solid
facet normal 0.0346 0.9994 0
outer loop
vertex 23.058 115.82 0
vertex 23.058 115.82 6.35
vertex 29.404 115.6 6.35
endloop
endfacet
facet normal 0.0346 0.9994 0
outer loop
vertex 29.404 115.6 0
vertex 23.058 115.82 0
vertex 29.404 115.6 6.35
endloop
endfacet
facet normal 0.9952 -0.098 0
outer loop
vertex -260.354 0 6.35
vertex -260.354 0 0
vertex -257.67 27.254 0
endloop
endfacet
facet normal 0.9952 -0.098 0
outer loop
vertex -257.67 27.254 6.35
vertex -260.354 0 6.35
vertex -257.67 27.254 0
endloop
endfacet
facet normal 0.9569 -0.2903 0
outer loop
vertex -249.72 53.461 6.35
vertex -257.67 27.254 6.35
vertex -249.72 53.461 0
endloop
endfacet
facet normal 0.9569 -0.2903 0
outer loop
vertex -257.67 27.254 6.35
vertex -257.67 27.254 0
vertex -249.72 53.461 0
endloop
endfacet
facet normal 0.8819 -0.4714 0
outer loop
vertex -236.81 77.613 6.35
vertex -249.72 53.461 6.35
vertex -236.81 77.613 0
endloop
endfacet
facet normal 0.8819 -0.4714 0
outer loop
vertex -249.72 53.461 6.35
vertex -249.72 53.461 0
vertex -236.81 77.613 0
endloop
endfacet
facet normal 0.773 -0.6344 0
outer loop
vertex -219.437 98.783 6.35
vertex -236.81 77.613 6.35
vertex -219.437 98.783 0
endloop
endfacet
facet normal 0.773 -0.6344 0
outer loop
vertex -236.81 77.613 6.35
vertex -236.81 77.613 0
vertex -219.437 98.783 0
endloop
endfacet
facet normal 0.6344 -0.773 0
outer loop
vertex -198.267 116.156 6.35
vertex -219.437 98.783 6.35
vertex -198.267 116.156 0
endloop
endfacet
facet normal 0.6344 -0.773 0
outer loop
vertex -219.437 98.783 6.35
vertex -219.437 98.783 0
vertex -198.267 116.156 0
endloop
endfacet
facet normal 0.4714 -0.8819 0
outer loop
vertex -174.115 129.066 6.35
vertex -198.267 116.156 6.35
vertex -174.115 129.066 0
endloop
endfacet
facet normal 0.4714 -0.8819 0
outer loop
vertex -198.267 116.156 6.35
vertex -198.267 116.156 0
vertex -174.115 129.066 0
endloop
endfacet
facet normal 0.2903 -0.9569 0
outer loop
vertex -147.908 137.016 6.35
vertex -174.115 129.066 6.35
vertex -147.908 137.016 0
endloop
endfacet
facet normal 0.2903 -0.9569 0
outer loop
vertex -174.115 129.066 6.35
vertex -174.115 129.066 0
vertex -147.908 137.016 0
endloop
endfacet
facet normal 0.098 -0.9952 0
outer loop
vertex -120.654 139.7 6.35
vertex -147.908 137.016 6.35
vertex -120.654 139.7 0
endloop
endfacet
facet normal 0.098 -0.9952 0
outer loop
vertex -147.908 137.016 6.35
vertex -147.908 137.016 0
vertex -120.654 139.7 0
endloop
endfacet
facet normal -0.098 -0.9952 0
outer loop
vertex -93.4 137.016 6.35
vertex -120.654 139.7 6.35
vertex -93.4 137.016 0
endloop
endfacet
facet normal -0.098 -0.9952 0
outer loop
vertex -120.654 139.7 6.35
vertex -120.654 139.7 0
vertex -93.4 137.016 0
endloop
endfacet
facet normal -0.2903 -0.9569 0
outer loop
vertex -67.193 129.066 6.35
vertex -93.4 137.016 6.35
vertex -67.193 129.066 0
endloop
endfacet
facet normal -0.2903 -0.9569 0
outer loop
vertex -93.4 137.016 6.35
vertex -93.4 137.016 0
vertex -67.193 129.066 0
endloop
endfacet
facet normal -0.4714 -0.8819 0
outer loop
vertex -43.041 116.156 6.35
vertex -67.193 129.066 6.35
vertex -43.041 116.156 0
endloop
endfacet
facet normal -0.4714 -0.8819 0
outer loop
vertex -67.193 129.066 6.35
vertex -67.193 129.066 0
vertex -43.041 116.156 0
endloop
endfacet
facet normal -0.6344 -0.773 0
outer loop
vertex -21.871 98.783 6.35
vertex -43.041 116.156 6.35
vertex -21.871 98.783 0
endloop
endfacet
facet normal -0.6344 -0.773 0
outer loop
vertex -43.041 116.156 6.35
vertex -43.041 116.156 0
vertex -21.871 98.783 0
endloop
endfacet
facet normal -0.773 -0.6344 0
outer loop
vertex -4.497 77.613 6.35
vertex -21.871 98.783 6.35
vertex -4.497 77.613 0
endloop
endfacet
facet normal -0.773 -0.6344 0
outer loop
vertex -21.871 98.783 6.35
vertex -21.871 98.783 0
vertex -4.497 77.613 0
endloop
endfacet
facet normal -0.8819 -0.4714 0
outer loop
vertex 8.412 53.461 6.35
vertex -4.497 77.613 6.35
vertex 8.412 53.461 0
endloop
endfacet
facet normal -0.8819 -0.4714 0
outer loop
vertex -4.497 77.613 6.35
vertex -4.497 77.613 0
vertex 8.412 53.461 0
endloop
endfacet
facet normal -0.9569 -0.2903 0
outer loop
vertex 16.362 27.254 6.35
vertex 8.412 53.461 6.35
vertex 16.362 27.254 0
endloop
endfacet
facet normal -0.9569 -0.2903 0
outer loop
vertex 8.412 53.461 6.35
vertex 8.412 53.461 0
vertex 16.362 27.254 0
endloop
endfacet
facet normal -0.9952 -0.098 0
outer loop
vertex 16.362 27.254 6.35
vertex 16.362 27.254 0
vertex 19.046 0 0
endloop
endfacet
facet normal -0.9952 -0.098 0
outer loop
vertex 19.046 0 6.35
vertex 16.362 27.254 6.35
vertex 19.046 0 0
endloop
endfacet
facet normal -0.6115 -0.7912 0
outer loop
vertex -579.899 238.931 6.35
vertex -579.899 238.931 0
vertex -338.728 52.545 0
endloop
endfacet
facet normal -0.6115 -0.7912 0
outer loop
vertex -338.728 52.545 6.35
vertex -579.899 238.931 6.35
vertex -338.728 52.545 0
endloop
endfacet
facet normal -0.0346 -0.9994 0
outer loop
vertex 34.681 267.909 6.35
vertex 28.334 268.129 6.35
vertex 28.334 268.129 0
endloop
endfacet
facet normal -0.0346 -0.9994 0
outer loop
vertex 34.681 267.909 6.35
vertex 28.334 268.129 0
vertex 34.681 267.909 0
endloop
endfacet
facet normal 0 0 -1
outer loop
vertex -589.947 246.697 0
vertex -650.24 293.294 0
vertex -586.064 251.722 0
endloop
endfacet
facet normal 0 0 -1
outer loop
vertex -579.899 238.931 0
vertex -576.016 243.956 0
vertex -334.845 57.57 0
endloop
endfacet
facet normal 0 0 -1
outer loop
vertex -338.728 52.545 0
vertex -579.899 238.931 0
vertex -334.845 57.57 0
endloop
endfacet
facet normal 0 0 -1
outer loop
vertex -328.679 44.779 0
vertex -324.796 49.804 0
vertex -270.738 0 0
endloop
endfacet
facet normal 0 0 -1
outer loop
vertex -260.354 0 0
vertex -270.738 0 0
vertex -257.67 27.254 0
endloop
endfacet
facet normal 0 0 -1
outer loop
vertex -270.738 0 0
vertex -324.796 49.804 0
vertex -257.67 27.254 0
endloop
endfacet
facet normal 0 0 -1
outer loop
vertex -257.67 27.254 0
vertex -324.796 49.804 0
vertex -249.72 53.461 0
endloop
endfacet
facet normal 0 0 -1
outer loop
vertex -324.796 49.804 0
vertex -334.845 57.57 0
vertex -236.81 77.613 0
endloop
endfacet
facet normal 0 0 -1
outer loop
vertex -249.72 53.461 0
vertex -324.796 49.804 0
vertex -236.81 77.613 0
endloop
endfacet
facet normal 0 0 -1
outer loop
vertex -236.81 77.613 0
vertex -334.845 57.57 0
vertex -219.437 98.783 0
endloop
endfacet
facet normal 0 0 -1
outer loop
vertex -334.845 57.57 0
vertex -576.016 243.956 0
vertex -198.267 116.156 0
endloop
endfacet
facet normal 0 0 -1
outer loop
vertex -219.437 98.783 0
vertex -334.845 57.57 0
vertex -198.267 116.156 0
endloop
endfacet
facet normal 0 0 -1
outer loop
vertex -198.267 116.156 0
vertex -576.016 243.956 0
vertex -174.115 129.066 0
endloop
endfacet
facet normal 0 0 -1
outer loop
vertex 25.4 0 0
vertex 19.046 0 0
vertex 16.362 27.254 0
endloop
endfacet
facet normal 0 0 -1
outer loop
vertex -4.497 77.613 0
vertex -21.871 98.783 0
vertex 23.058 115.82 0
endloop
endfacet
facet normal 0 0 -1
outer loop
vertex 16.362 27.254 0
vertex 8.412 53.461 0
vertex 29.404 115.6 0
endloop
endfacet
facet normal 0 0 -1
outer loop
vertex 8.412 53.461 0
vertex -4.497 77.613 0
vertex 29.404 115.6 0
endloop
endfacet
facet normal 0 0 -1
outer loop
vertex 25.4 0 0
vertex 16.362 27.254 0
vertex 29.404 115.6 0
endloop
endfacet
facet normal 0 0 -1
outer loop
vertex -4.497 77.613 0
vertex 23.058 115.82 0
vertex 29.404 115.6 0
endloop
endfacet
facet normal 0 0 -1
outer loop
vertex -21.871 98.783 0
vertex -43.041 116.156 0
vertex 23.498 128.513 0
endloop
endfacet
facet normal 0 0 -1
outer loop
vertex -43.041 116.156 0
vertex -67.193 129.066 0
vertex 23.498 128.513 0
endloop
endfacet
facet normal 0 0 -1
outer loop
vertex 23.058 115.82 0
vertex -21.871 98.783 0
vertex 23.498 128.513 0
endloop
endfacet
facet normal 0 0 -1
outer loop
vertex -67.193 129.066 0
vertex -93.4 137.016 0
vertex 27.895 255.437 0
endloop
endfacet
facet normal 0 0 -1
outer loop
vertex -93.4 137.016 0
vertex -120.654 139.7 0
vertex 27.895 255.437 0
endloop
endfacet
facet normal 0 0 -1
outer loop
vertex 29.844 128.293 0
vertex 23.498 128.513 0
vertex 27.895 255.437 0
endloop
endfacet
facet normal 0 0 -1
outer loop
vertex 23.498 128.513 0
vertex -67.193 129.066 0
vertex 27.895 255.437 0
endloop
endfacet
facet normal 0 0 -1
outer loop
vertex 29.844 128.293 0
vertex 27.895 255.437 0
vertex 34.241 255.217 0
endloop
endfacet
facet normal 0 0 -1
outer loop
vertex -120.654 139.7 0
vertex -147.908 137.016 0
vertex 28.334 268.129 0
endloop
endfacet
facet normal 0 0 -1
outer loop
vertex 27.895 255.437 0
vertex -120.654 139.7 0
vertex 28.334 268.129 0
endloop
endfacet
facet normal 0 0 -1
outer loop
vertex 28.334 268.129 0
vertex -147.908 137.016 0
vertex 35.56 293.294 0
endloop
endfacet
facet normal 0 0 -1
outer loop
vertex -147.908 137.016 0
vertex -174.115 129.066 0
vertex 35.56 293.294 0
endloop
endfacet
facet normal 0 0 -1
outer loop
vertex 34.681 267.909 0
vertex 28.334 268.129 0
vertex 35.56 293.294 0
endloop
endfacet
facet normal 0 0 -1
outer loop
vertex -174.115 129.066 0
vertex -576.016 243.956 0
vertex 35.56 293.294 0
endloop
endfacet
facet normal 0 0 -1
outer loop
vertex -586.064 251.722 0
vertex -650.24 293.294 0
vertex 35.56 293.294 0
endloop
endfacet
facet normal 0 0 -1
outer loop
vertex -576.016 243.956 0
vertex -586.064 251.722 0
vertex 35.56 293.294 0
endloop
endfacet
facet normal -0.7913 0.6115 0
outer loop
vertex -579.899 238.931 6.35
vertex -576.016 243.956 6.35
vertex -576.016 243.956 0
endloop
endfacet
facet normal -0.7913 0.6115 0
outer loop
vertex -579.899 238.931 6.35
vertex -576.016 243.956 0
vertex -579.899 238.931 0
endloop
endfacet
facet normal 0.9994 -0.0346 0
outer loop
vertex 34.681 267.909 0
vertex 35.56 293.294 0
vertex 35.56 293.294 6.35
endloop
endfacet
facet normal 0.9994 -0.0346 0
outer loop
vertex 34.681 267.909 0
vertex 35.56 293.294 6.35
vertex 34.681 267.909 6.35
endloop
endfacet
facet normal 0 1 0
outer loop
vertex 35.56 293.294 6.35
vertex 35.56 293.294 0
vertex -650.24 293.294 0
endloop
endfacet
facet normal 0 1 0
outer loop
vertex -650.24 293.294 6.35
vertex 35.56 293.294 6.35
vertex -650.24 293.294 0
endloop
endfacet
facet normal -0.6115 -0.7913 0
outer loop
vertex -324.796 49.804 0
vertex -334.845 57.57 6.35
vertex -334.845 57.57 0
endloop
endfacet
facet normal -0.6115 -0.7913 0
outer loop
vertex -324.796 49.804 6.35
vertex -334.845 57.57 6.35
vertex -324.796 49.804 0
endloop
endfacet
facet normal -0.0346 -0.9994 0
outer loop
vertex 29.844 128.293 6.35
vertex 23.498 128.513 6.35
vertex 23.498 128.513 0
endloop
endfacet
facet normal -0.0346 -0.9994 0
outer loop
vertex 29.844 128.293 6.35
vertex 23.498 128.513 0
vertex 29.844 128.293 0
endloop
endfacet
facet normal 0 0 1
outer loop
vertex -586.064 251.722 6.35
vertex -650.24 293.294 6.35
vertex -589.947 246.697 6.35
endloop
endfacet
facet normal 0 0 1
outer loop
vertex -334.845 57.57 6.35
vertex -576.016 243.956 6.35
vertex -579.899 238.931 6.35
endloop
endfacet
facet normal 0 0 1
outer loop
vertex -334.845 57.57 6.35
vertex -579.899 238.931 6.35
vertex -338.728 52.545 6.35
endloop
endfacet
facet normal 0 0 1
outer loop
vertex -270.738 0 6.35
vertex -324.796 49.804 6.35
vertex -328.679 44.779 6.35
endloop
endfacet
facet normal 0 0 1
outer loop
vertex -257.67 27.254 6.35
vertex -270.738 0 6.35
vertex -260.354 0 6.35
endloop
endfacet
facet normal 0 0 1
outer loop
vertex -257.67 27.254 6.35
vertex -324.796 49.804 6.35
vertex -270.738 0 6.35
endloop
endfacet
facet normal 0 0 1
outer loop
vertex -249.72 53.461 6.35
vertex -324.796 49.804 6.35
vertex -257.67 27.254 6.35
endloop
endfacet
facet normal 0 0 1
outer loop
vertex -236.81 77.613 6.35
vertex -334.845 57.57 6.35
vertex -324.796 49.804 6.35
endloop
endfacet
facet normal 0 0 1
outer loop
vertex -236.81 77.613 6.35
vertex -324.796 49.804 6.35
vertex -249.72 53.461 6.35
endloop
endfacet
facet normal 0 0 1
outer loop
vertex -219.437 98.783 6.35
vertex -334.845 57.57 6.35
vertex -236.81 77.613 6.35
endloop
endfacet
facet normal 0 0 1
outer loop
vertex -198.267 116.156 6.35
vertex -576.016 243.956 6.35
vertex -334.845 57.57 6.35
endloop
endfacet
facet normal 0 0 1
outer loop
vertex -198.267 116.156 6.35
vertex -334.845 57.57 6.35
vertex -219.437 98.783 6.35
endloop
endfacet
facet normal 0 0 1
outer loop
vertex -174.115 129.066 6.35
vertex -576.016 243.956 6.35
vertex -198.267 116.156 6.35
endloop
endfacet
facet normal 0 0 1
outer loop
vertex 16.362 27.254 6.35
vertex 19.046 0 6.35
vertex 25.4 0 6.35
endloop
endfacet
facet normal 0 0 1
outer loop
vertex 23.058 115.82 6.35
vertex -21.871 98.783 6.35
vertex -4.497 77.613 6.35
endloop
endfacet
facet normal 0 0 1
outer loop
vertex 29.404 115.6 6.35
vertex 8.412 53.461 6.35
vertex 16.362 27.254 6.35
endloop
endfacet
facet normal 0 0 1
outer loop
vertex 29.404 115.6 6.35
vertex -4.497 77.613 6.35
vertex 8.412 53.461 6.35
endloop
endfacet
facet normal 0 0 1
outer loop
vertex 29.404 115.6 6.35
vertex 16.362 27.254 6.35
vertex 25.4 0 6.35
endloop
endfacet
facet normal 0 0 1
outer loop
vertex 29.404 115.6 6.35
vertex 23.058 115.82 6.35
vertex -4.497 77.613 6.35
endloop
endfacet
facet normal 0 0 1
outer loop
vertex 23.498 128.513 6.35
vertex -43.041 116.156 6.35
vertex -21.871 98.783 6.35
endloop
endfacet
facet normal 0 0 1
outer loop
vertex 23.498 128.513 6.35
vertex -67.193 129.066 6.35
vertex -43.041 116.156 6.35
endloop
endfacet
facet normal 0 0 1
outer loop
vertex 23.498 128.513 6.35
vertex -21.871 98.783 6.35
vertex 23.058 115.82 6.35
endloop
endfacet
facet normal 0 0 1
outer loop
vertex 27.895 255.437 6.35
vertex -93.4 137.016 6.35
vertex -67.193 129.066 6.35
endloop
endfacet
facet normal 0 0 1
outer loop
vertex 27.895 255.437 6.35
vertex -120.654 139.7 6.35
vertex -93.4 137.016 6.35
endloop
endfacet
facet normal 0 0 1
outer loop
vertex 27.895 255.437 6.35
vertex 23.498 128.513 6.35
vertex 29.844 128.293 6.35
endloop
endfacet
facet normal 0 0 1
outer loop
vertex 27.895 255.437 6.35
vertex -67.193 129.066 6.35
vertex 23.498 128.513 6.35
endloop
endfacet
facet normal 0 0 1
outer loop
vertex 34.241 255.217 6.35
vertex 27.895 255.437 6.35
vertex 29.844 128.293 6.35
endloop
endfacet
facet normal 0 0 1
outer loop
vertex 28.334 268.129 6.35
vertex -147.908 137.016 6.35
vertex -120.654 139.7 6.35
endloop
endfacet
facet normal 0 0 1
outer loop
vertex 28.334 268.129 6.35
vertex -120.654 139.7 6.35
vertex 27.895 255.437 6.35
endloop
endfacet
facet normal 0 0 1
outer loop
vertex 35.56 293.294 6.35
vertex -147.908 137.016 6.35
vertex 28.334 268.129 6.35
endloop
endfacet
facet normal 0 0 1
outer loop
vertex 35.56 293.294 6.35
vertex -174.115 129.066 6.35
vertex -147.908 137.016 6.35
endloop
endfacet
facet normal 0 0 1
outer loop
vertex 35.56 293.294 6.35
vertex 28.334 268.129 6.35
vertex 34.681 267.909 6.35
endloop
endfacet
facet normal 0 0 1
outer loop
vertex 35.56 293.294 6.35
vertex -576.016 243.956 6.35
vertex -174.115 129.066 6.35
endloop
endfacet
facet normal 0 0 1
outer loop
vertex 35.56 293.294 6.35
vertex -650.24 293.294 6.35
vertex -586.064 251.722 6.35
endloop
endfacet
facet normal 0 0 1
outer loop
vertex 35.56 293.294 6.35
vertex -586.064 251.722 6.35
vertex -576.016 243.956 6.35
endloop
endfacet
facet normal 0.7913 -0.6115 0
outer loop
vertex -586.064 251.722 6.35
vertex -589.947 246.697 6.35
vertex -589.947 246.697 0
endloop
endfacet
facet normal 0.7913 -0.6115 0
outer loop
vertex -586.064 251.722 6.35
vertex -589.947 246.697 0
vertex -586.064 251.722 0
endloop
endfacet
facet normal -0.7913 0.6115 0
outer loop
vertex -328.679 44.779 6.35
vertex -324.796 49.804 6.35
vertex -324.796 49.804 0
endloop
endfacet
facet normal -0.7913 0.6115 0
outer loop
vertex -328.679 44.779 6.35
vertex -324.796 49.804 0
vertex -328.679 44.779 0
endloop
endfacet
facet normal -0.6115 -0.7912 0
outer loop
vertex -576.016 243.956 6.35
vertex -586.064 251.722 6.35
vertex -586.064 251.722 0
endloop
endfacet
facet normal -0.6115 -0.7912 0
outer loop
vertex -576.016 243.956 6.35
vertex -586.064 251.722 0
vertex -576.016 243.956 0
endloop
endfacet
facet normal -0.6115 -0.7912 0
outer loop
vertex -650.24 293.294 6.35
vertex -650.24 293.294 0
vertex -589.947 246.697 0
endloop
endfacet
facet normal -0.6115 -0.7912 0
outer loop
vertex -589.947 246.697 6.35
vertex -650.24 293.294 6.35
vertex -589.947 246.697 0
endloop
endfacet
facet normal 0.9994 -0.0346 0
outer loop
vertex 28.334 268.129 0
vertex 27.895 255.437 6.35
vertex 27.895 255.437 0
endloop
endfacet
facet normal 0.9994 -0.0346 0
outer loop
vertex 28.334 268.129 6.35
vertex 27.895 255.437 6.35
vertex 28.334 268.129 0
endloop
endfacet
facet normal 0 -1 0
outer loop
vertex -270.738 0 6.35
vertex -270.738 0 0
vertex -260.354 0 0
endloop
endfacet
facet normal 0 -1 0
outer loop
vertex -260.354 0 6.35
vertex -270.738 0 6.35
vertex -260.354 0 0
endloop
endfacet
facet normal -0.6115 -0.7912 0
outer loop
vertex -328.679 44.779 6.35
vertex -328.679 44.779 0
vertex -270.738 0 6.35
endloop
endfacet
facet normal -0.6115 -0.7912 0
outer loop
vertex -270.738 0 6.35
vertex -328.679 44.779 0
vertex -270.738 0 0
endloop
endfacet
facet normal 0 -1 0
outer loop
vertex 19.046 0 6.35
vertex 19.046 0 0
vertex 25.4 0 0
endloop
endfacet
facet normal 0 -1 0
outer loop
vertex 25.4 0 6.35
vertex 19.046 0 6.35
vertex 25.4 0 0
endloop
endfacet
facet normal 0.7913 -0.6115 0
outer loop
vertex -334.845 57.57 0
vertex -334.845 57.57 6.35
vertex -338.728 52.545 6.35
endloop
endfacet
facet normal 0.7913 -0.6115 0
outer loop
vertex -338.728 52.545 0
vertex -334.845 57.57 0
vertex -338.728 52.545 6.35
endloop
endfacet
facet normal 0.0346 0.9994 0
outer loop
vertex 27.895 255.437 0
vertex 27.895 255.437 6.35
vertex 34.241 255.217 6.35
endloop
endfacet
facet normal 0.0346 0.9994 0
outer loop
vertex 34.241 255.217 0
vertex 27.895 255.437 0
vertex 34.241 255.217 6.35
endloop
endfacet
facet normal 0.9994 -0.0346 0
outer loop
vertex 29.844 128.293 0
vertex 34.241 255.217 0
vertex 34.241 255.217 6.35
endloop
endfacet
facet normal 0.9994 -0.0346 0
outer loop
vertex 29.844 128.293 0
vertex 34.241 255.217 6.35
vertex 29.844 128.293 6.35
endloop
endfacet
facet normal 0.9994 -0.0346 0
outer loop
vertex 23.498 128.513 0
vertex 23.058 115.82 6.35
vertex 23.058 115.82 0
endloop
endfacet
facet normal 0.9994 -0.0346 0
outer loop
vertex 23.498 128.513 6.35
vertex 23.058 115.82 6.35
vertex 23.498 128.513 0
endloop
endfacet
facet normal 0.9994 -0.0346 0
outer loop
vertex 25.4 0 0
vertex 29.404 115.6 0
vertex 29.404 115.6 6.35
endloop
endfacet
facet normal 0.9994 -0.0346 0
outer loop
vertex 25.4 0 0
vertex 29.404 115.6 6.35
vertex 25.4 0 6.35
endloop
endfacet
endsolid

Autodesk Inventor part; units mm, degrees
ref_plane "YZ Plane" through (0, 0, 0) normal (1, 0, 0) x (0, 1, 0)
ref_plane "XZ Plane" through (0, 0, 0) normal (0, 1, 0) x (-1, 0, 0)
ref_plane "XY Plane" through (0, 0, 0) normal (0, 0, 1) x (1, 0, 0)
sketch "Sketch1" plane through (0, 0, 0) normal (0, 0, 1) x (1, 0, 0)
  line L0 (35.56, 293.2939) -> (25.4, 0)
  line L1 (35.56, 293.2939) -> (-650.24, 293.2939)
  line L2 (-650.24, 293.2939) -> (-270.7381, 0)
  arc A0 (19.0462, 0) -> (-260.3538, 0) centre (-120.6538, 0) ccw
  line L3 (-270.7381, 0) -> (-260.3538, 0)
  line L4 (19.0462, 0) -> (25.4, 0)
  point P0 (0, 0)
  dimension "d2" = 293.2939
  dimension "d3" = 35.56
  dimension "d4" = 25.4
  dimension "d5" = 685.8
  dimension "d8" = 279.4
  dimension "d11" = 6.35
  dimension "d12" = 6.35
extrude "Extrusion1" add sketch "Sketch1" along normal blind 6.35
sketch "Sketch2" plane through (0, 0, 6.35) normal (0, 0, 1) x (1, 0, 0)
  line L0 (25.4, 0) -> (35.56, 293.2939) projected
  line L1 (28.3345, 268.129) -> (34.6806, 267.9092)
  line L2 (27.8948, 255.4366) -> (34.241, 255.2168)
  line L3 (23.498, 128.5127) -> (29.8442, 128.2929)
  line L4 (23.0583, 115.8204) -> (29.4045, 115.6005)
  line L5 (23.0583, 115.8204) -> (23.498, 128.5127)
  line L6 (27.8948, 255.4366) -> (28.3345, 268.129)
  point P0 (0, 0)
  dimension "d21" = 12.7
  dimension "d23" = 12.7
  dimension "d24" = 25.4
  dimension "d25" = 127
extrude "Extrusion2" cut sketch "Sketch2" against normal blind 6.35
sketch "Sketch3" plane through (0, 0, 6.35) normal (0, 0, 1) x (1, 0, 0)
  line L0 (-650.24, 293.2939) -> (-270.7381, 0) projected
  line L1 (-589.9473, 246.6974) -> (-586.0643, 251.7218)
  line L2 (-576.0155, 243.9557) -> (-579.8986, 238.9313)
  line L3 (-334.8449, 57.5696) -> (-338.7279, 52.5452)
  line L4 (-324.7961, 49.8035) -> (-328.6792, 44.7792)
  line L5 (-586.0643, 251.7218) -> (-576.0155, 243.9557)
  line L6 (-334.8449, 57.5696) -> (-324.7961, 49.8035)
  point P0 (0, 0)
  dimension "d28" = 6.35
  dimension "d29" = 12.7
  dimension "d30" = 12.7
  dimension "d31" = 76.2
  dimension "d32" = 304.8
extrude "Extrusion3" cut sketch "Sketch3" against normal blind 6.35
properties part number "Funneling2" material "Polycarbonate, Clear"
